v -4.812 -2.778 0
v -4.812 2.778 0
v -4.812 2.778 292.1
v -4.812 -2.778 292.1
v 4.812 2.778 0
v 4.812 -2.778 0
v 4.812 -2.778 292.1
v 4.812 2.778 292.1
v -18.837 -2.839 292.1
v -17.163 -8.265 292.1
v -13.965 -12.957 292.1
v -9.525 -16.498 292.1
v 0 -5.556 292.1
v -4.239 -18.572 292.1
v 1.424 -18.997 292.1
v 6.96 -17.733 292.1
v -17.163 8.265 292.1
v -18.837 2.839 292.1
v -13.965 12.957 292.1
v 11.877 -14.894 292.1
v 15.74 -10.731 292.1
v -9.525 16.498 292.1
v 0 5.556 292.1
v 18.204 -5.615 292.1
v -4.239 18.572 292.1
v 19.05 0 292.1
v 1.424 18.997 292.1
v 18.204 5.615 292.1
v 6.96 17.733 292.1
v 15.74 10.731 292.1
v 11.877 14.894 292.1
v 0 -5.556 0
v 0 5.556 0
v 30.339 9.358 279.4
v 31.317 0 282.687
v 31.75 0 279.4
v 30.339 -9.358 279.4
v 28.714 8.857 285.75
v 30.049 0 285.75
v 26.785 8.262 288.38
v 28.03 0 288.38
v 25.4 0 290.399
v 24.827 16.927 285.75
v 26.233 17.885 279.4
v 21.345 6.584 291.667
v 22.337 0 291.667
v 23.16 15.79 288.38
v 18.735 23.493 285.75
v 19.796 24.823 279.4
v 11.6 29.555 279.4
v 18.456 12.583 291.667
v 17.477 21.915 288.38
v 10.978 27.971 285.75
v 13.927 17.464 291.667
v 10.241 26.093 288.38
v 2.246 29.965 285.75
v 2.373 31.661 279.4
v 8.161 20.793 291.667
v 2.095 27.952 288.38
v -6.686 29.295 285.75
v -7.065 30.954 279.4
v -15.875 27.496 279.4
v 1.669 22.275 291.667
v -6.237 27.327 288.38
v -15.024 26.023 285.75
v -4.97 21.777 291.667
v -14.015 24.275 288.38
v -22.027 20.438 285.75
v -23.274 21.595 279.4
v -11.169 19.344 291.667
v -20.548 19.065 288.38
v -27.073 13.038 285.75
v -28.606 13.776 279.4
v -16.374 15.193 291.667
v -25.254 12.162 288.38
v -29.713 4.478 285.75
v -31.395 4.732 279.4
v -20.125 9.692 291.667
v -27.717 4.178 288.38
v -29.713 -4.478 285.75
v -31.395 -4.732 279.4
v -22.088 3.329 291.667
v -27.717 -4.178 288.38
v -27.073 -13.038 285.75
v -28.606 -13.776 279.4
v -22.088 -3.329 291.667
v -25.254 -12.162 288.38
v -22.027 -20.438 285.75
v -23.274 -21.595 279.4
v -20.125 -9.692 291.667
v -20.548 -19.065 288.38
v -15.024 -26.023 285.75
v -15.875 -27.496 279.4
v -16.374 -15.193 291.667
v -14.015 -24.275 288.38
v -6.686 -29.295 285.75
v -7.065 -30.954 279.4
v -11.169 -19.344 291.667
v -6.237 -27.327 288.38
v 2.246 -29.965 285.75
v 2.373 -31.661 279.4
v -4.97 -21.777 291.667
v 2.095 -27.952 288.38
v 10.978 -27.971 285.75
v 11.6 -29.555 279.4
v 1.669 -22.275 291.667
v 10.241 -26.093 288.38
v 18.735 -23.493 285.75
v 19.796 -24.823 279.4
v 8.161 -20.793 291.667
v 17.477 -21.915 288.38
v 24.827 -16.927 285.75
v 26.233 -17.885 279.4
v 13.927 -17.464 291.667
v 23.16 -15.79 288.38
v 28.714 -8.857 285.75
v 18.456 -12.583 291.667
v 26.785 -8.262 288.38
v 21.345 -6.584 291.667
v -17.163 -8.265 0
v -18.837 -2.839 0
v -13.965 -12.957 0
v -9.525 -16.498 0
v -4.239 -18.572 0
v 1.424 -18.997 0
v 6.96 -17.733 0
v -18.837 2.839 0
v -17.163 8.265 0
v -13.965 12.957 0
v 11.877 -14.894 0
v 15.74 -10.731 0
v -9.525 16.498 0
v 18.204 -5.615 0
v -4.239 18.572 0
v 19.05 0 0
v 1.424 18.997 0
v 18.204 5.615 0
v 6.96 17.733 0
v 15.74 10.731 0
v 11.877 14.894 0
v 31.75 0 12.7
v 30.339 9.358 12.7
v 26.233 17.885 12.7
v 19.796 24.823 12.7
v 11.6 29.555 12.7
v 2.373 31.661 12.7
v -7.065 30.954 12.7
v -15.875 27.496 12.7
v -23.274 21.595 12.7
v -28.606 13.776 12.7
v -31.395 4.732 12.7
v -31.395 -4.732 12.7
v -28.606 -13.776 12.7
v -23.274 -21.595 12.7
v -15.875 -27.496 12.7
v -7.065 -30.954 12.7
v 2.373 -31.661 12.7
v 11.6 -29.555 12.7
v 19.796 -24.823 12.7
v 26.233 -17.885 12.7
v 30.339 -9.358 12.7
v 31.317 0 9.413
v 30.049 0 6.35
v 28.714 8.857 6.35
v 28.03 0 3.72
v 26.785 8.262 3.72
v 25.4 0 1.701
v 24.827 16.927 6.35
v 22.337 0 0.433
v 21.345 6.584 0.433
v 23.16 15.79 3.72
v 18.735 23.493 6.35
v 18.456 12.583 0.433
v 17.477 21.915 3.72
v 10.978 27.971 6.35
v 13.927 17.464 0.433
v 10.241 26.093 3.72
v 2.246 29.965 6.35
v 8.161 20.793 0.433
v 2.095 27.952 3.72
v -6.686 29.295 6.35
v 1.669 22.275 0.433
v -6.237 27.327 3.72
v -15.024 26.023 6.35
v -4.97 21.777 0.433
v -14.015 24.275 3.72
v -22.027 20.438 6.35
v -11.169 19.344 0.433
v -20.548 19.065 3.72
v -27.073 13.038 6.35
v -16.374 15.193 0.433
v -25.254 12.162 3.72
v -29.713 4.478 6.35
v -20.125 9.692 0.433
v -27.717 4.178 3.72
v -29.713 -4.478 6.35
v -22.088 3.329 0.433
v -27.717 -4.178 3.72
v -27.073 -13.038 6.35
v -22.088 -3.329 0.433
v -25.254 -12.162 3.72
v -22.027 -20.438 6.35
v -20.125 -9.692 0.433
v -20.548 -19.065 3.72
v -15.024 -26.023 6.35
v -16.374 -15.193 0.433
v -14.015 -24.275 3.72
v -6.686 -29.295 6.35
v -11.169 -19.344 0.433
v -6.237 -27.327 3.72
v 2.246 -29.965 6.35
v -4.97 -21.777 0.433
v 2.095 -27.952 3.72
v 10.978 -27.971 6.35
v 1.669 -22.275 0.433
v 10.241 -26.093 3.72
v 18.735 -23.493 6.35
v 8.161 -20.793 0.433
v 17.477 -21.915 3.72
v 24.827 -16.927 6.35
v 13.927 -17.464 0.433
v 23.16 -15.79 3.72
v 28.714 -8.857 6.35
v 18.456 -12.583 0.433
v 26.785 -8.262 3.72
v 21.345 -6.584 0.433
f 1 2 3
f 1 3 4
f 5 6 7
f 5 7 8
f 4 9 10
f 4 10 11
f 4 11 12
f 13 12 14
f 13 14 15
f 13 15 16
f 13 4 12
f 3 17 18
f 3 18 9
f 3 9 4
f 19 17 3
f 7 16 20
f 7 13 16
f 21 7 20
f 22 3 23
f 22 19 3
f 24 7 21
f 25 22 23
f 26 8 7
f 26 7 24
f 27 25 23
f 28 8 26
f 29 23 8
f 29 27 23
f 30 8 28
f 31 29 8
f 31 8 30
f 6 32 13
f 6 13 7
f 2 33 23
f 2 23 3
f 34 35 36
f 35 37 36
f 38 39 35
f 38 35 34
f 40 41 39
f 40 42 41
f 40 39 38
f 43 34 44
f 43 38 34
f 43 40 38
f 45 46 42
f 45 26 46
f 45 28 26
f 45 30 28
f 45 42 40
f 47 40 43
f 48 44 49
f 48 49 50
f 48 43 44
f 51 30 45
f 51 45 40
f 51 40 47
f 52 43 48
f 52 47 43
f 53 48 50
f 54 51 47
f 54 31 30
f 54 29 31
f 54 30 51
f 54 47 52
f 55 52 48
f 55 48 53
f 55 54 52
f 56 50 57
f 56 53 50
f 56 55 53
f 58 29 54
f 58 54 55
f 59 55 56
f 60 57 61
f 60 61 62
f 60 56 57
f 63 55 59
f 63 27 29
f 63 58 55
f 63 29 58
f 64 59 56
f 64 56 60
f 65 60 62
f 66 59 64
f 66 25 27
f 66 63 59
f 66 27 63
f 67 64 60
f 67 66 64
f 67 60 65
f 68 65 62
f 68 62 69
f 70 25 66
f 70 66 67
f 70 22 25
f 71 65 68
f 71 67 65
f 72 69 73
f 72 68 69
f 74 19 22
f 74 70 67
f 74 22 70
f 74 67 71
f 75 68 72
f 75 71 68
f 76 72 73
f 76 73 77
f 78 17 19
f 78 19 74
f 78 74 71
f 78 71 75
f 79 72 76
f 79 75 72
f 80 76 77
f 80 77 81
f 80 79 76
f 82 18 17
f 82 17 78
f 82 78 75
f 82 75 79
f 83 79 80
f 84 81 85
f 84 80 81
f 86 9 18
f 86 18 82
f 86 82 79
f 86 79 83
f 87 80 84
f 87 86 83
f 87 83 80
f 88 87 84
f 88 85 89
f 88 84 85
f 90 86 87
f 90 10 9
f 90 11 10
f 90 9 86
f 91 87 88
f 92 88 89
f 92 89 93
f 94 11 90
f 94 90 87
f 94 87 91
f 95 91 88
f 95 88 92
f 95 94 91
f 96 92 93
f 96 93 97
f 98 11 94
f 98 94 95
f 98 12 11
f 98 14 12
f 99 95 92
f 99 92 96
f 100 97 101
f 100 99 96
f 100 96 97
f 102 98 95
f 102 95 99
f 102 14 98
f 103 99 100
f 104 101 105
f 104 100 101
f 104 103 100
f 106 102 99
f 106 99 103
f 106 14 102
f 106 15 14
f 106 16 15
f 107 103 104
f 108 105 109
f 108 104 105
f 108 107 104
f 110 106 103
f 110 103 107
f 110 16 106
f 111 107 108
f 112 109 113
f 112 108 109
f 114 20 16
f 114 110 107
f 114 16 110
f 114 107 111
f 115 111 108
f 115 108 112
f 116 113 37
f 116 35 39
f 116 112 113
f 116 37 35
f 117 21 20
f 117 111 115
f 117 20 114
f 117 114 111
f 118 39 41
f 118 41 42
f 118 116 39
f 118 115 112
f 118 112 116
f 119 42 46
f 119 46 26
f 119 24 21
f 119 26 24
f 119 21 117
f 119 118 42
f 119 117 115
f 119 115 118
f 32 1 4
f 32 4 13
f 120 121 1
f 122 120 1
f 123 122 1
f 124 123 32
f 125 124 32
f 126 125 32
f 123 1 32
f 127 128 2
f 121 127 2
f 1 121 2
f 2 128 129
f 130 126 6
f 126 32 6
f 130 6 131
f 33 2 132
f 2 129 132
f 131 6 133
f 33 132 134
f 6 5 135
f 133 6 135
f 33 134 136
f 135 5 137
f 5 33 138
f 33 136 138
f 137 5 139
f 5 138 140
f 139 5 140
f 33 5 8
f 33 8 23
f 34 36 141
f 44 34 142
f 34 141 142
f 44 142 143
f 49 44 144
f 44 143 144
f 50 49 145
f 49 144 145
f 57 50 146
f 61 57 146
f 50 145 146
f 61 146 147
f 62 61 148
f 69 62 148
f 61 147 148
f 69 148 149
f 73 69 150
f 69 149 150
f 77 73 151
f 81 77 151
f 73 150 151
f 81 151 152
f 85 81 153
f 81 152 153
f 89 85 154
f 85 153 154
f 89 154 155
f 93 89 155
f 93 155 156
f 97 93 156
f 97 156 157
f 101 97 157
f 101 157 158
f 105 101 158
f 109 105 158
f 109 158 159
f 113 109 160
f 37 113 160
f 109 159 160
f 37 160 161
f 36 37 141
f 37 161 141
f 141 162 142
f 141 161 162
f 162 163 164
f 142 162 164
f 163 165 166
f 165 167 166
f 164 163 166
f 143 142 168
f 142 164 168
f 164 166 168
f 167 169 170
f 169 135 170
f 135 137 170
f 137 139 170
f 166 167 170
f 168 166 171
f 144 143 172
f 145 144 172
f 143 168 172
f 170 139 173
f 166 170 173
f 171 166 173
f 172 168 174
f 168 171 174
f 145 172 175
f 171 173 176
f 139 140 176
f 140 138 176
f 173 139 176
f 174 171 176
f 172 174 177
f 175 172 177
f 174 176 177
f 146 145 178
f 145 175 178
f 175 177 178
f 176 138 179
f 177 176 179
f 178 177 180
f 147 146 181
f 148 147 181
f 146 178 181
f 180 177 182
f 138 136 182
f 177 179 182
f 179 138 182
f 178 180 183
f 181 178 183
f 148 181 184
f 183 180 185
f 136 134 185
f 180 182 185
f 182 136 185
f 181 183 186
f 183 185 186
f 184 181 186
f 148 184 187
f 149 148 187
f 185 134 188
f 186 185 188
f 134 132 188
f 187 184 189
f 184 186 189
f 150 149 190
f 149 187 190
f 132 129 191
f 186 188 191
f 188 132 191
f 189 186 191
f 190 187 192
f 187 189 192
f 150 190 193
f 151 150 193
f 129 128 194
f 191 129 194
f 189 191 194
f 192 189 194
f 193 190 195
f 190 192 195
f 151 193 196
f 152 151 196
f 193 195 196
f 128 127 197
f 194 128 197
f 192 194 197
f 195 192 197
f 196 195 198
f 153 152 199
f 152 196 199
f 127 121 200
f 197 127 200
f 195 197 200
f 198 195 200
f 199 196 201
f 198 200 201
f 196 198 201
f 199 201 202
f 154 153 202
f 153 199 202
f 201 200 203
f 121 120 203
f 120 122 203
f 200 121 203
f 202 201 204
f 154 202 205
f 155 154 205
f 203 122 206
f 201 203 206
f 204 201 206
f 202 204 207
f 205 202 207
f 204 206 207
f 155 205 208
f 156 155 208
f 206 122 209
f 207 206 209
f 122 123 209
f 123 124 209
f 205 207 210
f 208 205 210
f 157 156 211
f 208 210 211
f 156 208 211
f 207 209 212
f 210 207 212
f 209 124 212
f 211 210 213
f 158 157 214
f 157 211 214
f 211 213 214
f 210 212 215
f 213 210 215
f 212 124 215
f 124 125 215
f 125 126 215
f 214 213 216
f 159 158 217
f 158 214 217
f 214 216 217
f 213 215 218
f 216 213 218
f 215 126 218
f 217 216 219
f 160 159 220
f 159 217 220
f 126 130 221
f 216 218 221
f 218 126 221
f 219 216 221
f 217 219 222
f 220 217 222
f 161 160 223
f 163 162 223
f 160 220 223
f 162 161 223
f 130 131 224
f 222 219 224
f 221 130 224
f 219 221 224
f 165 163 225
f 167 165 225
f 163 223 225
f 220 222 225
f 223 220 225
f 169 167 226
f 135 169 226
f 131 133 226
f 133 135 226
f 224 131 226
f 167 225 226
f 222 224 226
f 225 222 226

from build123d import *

# Parameters (mm, degrees)
SKETCH1_R           = 31.75
BOSS_EXTRUDE1_DEPTH = 292.1
FILLET1_R           = 12.7
FILLET2_R           = 12.7


with BuildPart() as part:
    # Sketch1 → Boss-Extrude1 (new body)
    with BuildSketch(Plane.XY):
        Circle(SKETCH1_R)
        Polygon((0, -5.55625), (4.81185365, -2.778125), (4.81185365, 2.778125), (0, 5.55625), (-4.81185365, 2.778125), (-4.81185365, -2.778125), align=None, mode=Mode.SUBTRACT)
    extrude(amount=BOSS_EXTRUDE1_DEPTH)

    # Fillet1
    fillet1_edges = [part.edges().sort_by_distance(p)[0] for p in [
        (-31.75, 0, 292.1),
    ]]
    fillet(fillet1_edges, radius=FILLET1_R)

    # Fillet2
    fillet2_edges = [part.edges().sort_by_distance(p)[0] for p in [
        (-31.75, 0, 0),
    ]]
    fillet(fillet2_edges, radius=FILLET2_R)


solid = part.part
